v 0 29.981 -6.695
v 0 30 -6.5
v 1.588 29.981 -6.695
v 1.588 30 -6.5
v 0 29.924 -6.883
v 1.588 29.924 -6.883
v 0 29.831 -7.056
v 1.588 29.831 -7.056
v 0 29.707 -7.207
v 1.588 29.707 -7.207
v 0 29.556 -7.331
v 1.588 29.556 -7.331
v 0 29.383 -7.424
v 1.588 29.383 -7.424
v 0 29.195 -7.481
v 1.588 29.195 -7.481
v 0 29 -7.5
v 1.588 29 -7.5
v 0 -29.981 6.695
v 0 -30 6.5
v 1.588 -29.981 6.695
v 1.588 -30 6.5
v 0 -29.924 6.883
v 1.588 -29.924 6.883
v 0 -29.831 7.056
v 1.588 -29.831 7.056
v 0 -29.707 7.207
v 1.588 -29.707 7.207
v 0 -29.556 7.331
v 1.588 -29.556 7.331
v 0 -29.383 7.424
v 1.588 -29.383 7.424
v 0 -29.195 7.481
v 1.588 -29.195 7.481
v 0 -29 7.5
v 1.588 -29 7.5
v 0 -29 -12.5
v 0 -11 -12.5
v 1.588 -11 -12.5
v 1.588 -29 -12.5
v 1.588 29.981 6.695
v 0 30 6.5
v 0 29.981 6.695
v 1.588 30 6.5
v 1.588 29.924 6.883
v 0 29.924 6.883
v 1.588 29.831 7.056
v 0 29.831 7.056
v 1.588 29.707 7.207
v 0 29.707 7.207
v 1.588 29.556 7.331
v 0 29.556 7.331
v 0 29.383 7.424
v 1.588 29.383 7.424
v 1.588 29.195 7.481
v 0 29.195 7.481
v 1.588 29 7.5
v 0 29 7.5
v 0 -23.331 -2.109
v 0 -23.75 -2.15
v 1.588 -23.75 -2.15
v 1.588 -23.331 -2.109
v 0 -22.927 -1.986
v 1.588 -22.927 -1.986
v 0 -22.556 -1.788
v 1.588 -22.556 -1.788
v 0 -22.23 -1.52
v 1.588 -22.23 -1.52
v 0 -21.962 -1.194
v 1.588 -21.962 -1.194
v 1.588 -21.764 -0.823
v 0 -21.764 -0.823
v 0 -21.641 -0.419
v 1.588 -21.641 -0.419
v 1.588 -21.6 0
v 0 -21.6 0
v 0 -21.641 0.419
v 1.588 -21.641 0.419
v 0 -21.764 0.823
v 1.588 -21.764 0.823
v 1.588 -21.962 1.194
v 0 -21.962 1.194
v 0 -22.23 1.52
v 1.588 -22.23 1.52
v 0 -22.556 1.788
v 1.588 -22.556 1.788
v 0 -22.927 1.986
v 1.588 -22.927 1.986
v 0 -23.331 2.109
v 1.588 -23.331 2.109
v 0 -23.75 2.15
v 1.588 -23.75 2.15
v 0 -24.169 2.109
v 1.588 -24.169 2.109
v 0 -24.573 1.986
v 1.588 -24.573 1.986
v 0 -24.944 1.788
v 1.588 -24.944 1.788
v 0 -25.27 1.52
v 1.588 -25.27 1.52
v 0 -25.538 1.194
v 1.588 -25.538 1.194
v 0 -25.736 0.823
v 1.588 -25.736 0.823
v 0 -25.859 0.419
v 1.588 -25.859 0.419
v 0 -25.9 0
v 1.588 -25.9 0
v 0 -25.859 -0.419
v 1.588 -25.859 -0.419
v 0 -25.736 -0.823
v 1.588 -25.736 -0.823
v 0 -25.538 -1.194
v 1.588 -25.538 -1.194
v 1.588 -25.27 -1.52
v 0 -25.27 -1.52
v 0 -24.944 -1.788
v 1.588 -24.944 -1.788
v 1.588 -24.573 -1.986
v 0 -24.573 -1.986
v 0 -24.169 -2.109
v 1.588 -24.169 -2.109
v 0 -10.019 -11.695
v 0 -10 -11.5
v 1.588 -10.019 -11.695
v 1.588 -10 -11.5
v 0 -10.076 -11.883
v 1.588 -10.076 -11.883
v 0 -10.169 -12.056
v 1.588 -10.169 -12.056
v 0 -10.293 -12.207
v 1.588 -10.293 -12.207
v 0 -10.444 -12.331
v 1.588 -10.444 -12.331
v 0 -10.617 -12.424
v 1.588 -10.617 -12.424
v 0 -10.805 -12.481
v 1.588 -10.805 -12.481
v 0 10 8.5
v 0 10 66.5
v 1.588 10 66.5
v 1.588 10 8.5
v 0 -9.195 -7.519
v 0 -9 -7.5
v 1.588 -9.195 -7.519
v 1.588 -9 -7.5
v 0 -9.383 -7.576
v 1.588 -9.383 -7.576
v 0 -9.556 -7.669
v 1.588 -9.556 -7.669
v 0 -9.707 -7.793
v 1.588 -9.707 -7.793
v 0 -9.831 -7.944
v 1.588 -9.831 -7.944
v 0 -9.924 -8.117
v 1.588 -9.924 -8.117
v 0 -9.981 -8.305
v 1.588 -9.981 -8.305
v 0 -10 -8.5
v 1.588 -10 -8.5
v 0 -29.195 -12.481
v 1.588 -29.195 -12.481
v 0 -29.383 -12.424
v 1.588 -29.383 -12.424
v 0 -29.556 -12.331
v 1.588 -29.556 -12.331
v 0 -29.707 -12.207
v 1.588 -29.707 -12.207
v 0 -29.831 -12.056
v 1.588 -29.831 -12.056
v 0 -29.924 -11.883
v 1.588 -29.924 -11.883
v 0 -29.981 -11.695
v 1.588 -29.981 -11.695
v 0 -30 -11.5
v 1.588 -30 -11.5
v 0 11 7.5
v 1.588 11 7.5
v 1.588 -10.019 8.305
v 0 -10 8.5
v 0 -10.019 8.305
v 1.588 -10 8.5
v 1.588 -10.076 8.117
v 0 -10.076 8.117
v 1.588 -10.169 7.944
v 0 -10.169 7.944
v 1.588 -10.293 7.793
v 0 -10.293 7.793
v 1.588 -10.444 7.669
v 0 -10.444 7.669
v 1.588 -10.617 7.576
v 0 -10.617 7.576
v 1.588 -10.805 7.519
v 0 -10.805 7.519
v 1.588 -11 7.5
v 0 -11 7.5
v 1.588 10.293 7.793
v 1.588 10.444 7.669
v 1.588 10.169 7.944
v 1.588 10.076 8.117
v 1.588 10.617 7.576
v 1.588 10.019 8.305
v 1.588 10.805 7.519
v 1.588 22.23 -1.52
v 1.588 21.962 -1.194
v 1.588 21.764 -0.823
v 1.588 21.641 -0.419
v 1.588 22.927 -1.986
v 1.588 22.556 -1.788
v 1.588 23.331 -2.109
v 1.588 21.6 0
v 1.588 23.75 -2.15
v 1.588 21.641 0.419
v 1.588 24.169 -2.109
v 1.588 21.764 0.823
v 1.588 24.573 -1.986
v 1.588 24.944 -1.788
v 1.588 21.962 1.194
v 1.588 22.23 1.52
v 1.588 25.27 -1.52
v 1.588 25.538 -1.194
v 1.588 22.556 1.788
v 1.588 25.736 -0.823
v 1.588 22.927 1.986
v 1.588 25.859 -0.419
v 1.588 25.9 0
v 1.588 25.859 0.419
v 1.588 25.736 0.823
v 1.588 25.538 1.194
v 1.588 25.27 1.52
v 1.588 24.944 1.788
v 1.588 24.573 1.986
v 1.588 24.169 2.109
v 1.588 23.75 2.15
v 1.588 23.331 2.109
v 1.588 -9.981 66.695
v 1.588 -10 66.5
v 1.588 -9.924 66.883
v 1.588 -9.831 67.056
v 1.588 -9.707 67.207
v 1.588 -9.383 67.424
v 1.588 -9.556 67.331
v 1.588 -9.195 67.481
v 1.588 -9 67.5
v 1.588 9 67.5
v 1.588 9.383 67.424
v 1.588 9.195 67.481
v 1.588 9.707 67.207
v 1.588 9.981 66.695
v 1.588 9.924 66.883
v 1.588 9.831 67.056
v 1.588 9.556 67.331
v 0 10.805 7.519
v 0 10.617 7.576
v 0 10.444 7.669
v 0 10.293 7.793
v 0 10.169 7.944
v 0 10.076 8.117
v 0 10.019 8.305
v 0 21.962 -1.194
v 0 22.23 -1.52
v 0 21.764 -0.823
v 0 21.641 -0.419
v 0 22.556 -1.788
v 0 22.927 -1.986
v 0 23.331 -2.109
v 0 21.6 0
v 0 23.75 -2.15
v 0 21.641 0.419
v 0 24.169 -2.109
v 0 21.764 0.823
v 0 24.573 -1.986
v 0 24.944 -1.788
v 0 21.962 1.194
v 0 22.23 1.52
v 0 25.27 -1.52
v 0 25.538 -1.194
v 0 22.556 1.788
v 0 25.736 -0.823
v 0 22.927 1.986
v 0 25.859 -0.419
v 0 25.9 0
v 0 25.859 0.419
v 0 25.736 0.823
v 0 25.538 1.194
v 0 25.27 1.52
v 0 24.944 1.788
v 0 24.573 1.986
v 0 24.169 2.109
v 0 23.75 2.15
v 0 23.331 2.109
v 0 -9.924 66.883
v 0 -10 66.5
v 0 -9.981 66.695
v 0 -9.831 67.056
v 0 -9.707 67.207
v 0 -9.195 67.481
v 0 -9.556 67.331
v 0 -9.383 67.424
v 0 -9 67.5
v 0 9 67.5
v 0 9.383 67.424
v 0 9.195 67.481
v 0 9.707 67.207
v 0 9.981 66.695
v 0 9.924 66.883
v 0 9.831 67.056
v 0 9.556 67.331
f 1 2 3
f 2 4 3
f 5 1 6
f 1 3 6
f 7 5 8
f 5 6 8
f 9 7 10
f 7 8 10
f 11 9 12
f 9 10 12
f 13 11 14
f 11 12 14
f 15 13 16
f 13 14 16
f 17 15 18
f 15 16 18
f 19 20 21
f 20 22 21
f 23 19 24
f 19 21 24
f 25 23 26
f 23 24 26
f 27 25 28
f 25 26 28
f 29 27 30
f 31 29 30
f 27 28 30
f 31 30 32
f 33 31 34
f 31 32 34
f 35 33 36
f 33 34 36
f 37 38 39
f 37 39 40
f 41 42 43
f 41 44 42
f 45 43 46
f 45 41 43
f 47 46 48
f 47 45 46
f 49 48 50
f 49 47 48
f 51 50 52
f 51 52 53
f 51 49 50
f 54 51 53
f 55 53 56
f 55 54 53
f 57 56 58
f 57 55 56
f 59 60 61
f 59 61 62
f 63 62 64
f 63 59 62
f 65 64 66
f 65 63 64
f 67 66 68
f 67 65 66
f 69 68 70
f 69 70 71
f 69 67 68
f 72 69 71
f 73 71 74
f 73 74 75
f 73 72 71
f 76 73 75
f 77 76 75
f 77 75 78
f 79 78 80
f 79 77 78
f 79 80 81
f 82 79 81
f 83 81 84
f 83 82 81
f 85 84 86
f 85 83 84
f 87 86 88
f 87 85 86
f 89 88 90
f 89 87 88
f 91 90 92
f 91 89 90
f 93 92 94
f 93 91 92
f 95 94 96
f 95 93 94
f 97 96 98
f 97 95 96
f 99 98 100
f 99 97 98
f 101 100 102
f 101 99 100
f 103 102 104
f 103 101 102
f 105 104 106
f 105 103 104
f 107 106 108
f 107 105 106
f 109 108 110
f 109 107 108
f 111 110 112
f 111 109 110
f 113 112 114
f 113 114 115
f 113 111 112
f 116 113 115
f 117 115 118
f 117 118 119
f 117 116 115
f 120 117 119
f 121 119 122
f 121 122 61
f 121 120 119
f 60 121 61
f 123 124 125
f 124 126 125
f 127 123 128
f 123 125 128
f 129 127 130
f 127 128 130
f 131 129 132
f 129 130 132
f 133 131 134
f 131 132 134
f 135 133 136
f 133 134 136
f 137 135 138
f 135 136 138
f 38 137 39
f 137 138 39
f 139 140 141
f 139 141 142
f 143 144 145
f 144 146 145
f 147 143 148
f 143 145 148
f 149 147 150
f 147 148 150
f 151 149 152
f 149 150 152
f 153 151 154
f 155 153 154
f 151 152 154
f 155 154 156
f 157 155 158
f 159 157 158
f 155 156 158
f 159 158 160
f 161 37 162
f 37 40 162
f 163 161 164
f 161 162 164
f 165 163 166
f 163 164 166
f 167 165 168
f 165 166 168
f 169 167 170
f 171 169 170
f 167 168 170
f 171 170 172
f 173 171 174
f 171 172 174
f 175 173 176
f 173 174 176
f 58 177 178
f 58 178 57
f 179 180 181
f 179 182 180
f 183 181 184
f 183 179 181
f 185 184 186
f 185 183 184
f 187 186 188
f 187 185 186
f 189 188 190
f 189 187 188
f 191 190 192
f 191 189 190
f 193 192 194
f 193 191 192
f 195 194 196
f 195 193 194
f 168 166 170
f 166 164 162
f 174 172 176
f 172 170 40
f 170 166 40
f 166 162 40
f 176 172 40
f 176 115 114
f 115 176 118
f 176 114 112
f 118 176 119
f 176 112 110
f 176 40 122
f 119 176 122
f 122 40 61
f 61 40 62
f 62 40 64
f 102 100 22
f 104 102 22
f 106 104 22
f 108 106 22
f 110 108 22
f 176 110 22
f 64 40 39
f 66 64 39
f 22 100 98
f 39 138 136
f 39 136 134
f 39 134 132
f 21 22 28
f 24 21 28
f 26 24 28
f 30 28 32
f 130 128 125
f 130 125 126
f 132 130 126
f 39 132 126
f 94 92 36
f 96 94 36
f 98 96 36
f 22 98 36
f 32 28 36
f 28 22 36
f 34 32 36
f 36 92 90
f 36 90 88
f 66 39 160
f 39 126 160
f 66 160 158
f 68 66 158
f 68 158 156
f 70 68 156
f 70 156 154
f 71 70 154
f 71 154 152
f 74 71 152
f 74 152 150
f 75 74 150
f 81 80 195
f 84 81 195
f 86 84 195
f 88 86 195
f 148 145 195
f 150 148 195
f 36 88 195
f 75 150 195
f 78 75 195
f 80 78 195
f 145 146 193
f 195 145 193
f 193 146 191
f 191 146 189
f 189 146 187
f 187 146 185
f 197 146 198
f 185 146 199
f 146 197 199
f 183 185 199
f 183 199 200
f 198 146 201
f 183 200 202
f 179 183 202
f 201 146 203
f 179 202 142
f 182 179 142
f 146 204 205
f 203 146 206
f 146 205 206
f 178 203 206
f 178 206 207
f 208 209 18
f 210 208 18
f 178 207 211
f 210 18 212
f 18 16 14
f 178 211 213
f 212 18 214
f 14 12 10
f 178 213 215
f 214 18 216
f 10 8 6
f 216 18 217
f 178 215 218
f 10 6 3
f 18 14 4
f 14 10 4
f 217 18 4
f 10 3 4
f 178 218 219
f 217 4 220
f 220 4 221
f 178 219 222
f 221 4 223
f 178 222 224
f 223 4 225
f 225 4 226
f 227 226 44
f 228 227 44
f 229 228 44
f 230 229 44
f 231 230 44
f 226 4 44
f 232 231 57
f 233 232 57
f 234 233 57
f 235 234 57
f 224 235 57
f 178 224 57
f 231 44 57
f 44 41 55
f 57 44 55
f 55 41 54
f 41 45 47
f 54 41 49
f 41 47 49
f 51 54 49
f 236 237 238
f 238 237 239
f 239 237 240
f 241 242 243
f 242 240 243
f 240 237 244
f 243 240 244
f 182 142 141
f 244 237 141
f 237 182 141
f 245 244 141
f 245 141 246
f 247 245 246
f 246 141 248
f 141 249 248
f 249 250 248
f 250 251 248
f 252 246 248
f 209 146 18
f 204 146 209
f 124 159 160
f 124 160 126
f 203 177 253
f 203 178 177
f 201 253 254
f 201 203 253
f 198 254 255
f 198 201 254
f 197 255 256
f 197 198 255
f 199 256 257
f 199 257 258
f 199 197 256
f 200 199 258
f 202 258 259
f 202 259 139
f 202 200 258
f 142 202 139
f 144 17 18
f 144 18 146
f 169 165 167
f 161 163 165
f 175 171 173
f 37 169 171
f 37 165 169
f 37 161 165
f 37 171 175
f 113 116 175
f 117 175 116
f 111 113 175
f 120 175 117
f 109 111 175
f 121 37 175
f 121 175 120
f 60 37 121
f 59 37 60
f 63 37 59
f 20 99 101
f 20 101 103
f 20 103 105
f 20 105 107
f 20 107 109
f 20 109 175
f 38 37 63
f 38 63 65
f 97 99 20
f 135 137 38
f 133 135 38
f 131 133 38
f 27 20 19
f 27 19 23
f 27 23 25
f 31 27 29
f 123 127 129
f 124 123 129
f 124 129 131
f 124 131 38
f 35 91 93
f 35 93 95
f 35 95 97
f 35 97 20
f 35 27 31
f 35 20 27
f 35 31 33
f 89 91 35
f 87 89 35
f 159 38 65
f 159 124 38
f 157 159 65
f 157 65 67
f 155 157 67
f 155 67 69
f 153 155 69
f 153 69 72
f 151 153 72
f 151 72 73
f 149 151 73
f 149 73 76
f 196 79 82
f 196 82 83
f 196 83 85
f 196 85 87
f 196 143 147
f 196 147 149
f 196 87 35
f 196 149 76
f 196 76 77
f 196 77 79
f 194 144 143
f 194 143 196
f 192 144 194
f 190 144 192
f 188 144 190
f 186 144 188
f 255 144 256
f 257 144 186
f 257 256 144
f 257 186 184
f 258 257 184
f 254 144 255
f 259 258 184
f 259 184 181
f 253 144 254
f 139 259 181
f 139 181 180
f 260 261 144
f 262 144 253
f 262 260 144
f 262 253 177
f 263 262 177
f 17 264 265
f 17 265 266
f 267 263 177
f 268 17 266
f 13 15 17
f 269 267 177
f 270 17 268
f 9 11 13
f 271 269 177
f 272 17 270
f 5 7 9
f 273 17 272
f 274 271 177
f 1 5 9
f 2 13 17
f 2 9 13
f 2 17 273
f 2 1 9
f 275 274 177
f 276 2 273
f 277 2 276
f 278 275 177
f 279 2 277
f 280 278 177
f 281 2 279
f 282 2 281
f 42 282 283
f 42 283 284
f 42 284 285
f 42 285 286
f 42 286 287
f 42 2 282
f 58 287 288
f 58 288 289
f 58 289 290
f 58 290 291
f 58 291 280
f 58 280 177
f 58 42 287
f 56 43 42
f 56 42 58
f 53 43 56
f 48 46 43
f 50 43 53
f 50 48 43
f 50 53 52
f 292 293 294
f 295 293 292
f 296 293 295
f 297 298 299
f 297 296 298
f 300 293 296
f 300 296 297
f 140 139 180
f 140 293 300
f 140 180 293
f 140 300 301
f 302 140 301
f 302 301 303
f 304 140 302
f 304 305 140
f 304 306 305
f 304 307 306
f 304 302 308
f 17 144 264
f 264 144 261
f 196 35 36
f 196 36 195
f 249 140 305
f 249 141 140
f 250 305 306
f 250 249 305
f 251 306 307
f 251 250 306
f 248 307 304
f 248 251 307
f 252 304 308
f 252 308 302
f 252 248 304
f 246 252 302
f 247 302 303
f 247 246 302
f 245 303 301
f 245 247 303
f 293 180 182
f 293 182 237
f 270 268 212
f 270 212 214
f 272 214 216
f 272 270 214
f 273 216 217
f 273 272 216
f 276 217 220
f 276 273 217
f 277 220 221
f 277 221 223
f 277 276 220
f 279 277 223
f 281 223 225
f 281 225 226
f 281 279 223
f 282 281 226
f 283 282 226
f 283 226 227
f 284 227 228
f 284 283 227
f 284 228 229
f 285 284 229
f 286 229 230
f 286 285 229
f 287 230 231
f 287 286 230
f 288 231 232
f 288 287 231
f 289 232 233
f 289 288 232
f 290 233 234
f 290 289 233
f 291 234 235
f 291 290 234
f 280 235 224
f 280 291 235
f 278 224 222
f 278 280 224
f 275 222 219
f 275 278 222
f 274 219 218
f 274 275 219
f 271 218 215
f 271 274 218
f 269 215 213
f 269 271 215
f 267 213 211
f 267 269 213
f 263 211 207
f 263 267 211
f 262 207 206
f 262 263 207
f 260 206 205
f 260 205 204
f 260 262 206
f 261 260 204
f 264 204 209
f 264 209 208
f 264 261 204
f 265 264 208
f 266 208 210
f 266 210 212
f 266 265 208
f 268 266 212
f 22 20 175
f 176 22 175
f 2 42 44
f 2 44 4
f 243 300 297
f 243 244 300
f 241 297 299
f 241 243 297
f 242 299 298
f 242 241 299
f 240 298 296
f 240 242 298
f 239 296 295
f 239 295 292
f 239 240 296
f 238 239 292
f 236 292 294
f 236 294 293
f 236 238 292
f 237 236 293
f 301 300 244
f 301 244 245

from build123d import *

# Parameters (mm, degrees)
SKETCH1_R           = 2.15
BOSS_EXTRUDE1_DEPTH = 1.5875
FILLET1_R           = 1


with BuildPart() as part:
    # Sketch1 → Boss-Extrude1 (new body)
    with BuildSketch(Plane(origin=(0, 0, 0), x_dir=(0, 0, -1), z_dir=(1, 0, 0))):
        Polygon((-7.5, 30), (7.5, 30), (7.5, -10), (12.5, -10), (12.5, -30), (7.5, -30), (-7.5, -30), (-7.5, -10), (-67.5, -10), (-67.5, 10), (-7.5, 10), align=None)
        with Locations((0, 23.75)):
            Circle(SKETCH1_R, mode=Mode.SUBTRACT)
        with Locations((0, -23.75)):
            Circle(SKETCH1_R, mode=Mode.SUBTRACT)
    extrude(amount=BOSS_EXTRUDE1_DEPTH)

    # Fillet1
    fillet1_edges = [part.edges().sort_by_distance(p)[0] for p in [
        (0.79375, 30, 7.5),
        (0.79375, 30, -7.5),
        (0.79375, -10, -7.5),
        (0.79375, -10, -12.5),
        (0.79375, -30, -12.5),
        (0.79375, -30, 7.5),
        (0.79375, -10, 7.5),
        (0.79375, -10, 67.5),
        (0.79375, 10, 67.5),
        (0.79375, 10, 7.5),
    ]]
    fillet(fillet1_edges, radius=FILLET1_R)


solid = part.part
